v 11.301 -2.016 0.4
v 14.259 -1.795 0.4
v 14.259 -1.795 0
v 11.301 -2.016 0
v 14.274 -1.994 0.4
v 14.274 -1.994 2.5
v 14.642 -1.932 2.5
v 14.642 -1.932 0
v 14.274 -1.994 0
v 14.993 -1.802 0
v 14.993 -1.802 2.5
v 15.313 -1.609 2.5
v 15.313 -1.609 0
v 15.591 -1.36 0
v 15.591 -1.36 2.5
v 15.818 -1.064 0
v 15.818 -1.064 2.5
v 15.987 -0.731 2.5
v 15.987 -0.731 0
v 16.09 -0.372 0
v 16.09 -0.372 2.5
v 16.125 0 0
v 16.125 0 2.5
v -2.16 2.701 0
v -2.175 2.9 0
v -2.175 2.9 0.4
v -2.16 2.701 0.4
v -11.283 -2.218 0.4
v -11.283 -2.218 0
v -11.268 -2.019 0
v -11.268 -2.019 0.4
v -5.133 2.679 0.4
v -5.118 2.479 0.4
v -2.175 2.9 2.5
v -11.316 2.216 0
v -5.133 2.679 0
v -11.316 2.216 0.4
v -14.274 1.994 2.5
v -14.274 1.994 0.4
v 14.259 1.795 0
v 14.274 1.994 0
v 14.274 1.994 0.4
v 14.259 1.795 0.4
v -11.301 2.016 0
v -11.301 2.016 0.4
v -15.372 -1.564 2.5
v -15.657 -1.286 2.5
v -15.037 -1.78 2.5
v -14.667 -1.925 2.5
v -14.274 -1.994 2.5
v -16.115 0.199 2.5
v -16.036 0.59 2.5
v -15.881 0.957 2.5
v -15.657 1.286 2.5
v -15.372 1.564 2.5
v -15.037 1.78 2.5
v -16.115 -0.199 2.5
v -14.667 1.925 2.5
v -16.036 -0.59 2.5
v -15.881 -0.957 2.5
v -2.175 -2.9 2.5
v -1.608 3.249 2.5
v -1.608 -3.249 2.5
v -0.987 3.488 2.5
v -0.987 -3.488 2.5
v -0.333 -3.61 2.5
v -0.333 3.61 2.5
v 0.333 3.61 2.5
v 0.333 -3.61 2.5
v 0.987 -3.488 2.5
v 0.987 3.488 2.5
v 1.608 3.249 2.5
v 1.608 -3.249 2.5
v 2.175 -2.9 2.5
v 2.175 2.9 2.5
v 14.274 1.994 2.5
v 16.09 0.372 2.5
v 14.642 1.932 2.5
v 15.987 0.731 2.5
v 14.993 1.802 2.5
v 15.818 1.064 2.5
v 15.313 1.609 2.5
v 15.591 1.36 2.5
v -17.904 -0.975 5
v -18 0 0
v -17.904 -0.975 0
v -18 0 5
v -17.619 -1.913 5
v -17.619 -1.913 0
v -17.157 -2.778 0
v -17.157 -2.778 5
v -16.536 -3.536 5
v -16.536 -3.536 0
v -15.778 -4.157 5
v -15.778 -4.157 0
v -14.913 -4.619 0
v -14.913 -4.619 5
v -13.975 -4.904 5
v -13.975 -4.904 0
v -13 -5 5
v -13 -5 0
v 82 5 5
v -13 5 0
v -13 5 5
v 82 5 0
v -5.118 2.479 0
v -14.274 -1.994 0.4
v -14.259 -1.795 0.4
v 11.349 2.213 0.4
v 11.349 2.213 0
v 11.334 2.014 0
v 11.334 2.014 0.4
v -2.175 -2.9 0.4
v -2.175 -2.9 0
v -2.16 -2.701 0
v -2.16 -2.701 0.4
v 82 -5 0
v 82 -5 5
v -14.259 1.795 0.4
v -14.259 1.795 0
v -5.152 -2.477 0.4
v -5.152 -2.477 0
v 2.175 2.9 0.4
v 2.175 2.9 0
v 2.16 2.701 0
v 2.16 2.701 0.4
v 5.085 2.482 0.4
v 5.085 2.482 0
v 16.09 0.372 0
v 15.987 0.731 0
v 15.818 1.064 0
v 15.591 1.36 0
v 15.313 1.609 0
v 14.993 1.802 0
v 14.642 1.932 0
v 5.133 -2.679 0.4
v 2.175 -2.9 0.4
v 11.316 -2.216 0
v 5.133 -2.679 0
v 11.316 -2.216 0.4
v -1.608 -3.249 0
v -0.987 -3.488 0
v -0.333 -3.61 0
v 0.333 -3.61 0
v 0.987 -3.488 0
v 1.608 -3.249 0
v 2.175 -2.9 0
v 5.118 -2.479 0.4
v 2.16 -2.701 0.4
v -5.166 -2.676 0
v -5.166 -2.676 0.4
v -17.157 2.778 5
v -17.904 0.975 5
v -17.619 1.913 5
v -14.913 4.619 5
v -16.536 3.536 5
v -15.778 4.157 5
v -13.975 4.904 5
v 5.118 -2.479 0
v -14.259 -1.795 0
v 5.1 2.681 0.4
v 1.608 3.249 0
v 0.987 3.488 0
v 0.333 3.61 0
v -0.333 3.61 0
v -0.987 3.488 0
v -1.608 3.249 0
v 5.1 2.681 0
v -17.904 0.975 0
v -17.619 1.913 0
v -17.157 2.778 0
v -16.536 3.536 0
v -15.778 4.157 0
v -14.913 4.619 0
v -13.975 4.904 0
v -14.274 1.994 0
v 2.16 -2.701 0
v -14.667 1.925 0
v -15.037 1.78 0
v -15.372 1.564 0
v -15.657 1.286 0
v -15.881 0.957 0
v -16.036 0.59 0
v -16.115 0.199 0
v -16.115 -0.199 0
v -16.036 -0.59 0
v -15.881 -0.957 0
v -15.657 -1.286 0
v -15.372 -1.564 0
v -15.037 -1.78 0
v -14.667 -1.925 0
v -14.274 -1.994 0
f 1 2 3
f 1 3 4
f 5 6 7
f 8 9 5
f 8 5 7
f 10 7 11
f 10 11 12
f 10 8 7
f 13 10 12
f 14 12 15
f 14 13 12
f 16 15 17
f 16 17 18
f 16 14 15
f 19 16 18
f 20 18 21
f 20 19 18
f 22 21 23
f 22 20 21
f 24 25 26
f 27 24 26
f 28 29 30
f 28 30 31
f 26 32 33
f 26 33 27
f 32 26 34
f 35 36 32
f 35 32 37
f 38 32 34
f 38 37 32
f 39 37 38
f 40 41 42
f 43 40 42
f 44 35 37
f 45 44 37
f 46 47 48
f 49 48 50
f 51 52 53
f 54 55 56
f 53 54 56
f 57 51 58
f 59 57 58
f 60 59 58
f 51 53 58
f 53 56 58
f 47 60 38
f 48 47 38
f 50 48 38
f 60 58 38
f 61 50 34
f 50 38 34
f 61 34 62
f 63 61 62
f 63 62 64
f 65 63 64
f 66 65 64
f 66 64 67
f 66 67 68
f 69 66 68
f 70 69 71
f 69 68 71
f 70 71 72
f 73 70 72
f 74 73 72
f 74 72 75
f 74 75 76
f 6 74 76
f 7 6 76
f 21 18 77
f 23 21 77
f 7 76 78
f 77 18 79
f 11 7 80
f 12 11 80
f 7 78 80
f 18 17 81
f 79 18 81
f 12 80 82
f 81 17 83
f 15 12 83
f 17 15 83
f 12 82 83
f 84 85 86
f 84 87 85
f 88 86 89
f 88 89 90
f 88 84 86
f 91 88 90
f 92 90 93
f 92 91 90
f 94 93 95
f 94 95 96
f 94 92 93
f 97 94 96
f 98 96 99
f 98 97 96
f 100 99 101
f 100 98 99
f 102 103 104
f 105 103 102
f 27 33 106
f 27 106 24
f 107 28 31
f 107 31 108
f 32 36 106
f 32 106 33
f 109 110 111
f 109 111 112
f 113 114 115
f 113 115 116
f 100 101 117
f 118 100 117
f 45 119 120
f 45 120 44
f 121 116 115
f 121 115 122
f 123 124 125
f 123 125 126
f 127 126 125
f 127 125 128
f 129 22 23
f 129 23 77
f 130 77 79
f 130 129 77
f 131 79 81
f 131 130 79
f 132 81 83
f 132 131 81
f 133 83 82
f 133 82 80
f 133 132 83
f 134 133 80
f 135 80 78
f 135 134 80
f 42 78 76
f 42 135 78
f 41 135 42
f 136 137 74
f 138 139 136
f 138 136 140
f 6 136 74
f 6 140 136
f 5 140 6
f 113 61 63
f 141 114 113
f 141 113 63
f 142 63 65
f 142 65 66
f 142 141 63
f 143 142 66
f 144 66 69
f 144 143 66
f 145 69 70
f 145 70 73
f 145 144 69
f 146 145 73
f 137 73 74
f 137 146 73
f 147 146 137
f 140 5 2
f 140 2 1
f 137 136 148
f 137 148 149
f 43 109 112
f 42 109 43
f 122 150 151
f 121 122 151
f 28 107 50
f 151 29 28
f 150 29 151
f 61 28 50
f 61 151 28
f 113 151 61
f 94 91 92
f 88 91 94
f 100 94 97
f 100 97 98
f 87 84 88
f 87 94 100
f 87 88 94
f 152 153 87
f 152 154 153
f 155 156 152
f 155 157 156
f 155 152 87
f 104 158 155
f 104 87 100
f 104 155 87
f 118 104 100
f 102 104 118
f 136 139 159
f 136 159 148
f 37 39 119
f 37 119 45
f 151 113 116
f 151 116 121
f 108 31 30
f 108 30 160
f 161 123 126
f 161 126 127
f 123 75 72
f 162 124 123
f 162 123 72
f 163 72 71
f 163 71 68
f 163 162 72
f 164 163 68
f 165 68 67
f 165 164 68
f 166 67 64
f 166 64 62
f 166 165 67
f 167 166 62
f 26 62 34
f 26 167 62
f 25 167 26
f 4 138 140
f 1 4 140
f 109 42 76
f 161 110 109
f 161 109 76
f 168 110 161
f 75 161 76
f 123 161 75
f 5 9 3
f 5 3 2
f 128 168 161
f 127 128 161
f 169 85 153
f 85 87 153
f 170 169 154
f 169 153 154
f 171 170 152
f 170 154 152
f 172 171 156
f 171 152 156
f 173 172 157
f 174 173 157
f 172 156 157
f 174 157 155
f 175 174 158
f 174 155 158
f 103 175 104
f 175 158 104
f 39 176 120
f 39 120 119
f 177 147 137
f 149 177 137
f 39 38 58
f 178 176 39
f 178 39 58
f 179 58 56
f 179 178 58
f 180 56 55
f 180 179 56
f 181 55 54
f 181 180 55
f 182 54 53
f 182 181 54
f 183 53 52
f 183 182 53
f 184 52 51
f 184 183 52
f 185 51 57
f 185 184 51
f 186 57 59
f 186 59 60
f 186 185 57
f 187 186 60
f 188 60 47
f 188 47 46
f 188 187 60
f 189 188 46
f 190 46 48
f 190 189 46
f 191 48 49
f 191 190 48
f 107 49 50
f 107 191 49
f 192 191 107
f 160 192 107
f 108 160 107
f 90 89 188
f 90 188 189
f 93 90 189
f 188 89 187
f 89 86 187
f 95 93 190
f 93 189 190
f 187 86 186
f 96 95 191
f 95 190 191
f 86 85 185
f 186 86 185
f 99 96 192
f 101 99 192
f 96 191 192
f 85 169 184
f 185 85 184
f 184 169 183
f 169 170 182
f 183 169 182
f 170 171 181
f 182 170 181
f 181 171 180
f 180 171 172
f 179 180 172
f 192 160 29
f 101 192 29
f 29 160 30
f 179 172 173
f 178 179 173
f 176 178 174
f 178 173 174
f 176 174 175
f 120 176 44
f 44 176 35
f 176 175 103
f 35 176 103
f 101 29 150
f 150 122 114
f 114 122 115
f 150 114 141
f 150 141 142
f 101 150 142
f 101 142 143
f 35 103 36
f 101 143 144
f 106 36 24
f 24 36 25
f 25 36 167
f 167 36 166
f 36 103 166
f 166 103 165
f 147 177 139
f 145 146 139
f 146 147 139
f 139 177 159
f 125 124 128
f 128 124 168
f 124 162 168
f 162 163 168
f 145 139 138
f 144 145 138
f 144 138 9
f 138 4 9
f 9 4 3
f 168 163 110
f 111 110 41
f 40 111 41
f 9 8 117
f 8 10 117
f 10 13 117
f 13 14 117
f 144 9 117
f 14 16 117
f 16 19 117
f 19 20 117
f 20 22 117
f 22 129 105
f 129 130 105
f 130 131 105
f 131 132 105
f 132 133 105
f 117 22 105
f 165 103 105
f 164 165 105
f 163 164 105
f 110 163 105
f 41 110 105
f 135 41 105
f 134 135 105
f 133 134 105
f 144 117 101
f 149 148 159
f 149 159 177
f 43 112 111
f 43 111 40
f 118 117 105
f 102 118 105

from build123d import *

# Parameters (mm, degrees)
F1_W      = 100
F1_H      = 10
F2_DEPTH  = 5
F3_DEPTH  = 2.5
F4_R      = 5
F5_R      = 4.99999
F6_W      = 3
F6_H      = 0.4
F7_DEPTH  = 0.2
F8_W      = 2.9665668664
F8_H      = 0.4
F9_DEPTH  = 0.2
F10_W     = 2.9665668664
F10_H     = 0.4
F11_DEPTH = 0.2
F12_W     = 2.9335063244
F12_H     = 0.4
F13_DEPTH = 0.2


# Not quite as in the source:
# - a fillet or chamfer is up to 0.001 mm smaller than in the source, because OpenCascade refuses the exact size


with BuildPart() as f2:
    # F1 (on Top) → F2 (new body)
    with BuildSketch(Plane.XY):
        with Locations((32, 0)):
            Rectangle(F1_W, F1_H)
    extrude(amount=F2_DEPTH)

    # F0 (on Top) → F3 (cut)
    with BuildSketch(Plane.XY):
        with BuildLine():
            ThreePointArc((-14.2742941918, -1.9944200271), (-12.7645935136, -1.4660471315), (-12.125, 0))
            ThreePointArc((-12.125, 0), (-12.7645935136, 1.4660471315), (-14.2742941918, 1.9944200271))
            ThreePointArc((-14.2742941918, 1.9944200271), (-16.125, 0), (-14.2742941918, -1.9944200271))
        make_face()
        with BuildLine():
            ThreePointArc((-14.2742941918, 1.9944200271), (-12.7645935136, 1.4660471315), (-12.125, 0))
            ThreePointArc((-12.125, 0), (-12.7645935136, -1.4660471315), (-14.2742941918, -1.9944200271))
            Line((-14.2742941918, -1.9944200271), (-2.1748161696, -2.9001378637))
            ThreePointArc((-2.1748161696, -2.9001378637), (-3.625, 0), (-2.1748161696, 2.9001378637))
            Line((-2.1748161696, 2.9001378637), (-14.2742941918, 1.9944200271))
        make_face()
        with BuildLine():
            Line((0, 3.0629357789), (-2.1748161696, 2.9001378637))
            ThreePointArc((-2.1748161696, 2.9001378637), (-3.625, 0), (-2.1748161696, -2.9001378637))
            Line((-2.1748161696, -2.9001378637), (0, -3.0629357789))
            Line((0, -3.0629357789), (2.1748161696, -2.9001378637))
            ThreePointArc((2.1748161696, -2.9001378637), (3.2422471848, -1.6212520448), (3.625, 0))
            ThreePointArc((3.625, 0), (3.2422471848, 1.6212520448), (2.1748161696, 2.9001378637))
            Line((2.1748161696, 2.9001378637), (0, 3.0629357789))
        make_face()
        with BuildLine():
            ThreePointArc((2.1748161696, 2.9001378637), (0, 3.625), (-2.1748161696, 2.9001378637))
            Line((-2.1748161696, 2.9001378637), (0, 3.0629357789))
            Line((0, 3.0629357789), (2.1748161696, 2.9001378637))
        make_face()
        with BuildLine():
            Line((0, -3.0629357789), (-2.1748161696, -2.9001378637))
            ThreePointArc((-2.1748161696, -2.9001378637), (0, -3.625), (2.1748161696, -2.9001378637))
            Line((2.1748161696, -2.9001378637), (0, -3.0629357789))
        make_face()
        with BuildLine():
            Line((14.2742941918, 1.9944200271), (2.1748161696, 2.9001378637))
            ThreePointArc((2.1748161696, 2.9001378637), (3.2422471848, 1.6212520448), (3.625, 0))
            ThreePointArc((3.625, 0), (3.2422471848, -1.6212520448), (2.1748161696, -2.9001378637))
            Line((2.1748161696, -2.9001378637), (14.2742941918, -1.9944200271))
            ThreePointArc((14.2742941918, -1.9944200271), (12.125, 0), (14.2742941918, 1.9944200271))
        make_face()
        with BuildLine():
            ThreePointArc((16.125, 0), (15.5910471315, 1.3604064864), (14.2742941918, 1.9944200271))
            ThreePointArc((14.2742941918, 1.9944200271), (12.125, 0), (14.2742941918, -1.9944200271))
            ThreePointArc((14.2742941918, -1.9944200271), (15.5910471315, -1.3604064864), (16.125, 0))
        make_face()
    extrude(amount=F3_DEPTH, mode=Mode.SUBTRACT)

    # F4
    f4_edges = [f2.edges().sort_by_distance(p)[0] for p in [
        (-18, 5, 2.5),
    ]]
    fillet(f4_edges, radius=F4_R)

    # F5 (radius 5 in the source; OpenCascade refuses exactly that, so slightly less here)
    f5_edges = [f2.edges().sort_by_distance(p)[0] for p in [
        (-18, -5, 2.5),
    ]]
    fillet(f5_edges, radius=F5_R)

    # F6 (on face) → F7 (join)
    with BuildSketch(Plane(origin=(-0.2280013604, -3.045868522, 0), x_dir=(-0.9972100135, 0.0746470959, 0), z_dir=(0.0746470959, 0.9972100135, 0))):
        with Locations((12.585591441, 0.2)):
            Rectangle(F6_W, F6_H)
        with Locations((3.4522615926, 0.2)):
            Rectangle(F6_W, F6_H)
    extrude(amount=F7_DEPTH)

    # F8 (on face) → F9 (join)
    with BuildSketch(Plane(origin=(0.2280013604, -3.045868522, 0), x_dir=(-0.9972100135, -0.0746470959, 0), z_dir=(-0.0746470959, 0.9972100135, 0))):
        with Locations((-3.4355450259, 0.2)):
            Rectangle(F8_W, F8_H)
        with Locations((-12.6023080078, 0.2)):
            Rectangle(F8_W, F8_H)
    extrude(amount=F9_DEPTH)

    # F10 (on face) → F11 (join)
    with BuildSketch(Plane(origin=(-0.2280013604, 3.045868522, 0), x_dir=(0.9972100135, 0.0746470959, 0), z_dir=(0.0746470959, -0.9972100135, 0))):
        with Locations((-3.4355450259, 0.2)):
            Rectangle(F10_W, F10_H)
        with Locations((-12.6023080078, 0.2)):
            Rectangle(F10_W, F10_H)
    extrude(amount=F11_DEPTH)

    # F12 (on face) → F13 (join)
    with BuildSketch(Plane(origin=(0.2280013604, 3.045868522, 0), x_dir=(0.9972100135, -0.0746470959, 0), z_dir=(-0.0746470959, -0.9972100135, 0))):
        with Locations((12.6188382789, 0.2)):
            Rectangle(F12_W, F12_H)
        with Locations((3.4190147548, 0.2)):
            Rectangle(F12_W, F12_H)
    extrude(amount=F13_DEPTH)


solid = f2.part
